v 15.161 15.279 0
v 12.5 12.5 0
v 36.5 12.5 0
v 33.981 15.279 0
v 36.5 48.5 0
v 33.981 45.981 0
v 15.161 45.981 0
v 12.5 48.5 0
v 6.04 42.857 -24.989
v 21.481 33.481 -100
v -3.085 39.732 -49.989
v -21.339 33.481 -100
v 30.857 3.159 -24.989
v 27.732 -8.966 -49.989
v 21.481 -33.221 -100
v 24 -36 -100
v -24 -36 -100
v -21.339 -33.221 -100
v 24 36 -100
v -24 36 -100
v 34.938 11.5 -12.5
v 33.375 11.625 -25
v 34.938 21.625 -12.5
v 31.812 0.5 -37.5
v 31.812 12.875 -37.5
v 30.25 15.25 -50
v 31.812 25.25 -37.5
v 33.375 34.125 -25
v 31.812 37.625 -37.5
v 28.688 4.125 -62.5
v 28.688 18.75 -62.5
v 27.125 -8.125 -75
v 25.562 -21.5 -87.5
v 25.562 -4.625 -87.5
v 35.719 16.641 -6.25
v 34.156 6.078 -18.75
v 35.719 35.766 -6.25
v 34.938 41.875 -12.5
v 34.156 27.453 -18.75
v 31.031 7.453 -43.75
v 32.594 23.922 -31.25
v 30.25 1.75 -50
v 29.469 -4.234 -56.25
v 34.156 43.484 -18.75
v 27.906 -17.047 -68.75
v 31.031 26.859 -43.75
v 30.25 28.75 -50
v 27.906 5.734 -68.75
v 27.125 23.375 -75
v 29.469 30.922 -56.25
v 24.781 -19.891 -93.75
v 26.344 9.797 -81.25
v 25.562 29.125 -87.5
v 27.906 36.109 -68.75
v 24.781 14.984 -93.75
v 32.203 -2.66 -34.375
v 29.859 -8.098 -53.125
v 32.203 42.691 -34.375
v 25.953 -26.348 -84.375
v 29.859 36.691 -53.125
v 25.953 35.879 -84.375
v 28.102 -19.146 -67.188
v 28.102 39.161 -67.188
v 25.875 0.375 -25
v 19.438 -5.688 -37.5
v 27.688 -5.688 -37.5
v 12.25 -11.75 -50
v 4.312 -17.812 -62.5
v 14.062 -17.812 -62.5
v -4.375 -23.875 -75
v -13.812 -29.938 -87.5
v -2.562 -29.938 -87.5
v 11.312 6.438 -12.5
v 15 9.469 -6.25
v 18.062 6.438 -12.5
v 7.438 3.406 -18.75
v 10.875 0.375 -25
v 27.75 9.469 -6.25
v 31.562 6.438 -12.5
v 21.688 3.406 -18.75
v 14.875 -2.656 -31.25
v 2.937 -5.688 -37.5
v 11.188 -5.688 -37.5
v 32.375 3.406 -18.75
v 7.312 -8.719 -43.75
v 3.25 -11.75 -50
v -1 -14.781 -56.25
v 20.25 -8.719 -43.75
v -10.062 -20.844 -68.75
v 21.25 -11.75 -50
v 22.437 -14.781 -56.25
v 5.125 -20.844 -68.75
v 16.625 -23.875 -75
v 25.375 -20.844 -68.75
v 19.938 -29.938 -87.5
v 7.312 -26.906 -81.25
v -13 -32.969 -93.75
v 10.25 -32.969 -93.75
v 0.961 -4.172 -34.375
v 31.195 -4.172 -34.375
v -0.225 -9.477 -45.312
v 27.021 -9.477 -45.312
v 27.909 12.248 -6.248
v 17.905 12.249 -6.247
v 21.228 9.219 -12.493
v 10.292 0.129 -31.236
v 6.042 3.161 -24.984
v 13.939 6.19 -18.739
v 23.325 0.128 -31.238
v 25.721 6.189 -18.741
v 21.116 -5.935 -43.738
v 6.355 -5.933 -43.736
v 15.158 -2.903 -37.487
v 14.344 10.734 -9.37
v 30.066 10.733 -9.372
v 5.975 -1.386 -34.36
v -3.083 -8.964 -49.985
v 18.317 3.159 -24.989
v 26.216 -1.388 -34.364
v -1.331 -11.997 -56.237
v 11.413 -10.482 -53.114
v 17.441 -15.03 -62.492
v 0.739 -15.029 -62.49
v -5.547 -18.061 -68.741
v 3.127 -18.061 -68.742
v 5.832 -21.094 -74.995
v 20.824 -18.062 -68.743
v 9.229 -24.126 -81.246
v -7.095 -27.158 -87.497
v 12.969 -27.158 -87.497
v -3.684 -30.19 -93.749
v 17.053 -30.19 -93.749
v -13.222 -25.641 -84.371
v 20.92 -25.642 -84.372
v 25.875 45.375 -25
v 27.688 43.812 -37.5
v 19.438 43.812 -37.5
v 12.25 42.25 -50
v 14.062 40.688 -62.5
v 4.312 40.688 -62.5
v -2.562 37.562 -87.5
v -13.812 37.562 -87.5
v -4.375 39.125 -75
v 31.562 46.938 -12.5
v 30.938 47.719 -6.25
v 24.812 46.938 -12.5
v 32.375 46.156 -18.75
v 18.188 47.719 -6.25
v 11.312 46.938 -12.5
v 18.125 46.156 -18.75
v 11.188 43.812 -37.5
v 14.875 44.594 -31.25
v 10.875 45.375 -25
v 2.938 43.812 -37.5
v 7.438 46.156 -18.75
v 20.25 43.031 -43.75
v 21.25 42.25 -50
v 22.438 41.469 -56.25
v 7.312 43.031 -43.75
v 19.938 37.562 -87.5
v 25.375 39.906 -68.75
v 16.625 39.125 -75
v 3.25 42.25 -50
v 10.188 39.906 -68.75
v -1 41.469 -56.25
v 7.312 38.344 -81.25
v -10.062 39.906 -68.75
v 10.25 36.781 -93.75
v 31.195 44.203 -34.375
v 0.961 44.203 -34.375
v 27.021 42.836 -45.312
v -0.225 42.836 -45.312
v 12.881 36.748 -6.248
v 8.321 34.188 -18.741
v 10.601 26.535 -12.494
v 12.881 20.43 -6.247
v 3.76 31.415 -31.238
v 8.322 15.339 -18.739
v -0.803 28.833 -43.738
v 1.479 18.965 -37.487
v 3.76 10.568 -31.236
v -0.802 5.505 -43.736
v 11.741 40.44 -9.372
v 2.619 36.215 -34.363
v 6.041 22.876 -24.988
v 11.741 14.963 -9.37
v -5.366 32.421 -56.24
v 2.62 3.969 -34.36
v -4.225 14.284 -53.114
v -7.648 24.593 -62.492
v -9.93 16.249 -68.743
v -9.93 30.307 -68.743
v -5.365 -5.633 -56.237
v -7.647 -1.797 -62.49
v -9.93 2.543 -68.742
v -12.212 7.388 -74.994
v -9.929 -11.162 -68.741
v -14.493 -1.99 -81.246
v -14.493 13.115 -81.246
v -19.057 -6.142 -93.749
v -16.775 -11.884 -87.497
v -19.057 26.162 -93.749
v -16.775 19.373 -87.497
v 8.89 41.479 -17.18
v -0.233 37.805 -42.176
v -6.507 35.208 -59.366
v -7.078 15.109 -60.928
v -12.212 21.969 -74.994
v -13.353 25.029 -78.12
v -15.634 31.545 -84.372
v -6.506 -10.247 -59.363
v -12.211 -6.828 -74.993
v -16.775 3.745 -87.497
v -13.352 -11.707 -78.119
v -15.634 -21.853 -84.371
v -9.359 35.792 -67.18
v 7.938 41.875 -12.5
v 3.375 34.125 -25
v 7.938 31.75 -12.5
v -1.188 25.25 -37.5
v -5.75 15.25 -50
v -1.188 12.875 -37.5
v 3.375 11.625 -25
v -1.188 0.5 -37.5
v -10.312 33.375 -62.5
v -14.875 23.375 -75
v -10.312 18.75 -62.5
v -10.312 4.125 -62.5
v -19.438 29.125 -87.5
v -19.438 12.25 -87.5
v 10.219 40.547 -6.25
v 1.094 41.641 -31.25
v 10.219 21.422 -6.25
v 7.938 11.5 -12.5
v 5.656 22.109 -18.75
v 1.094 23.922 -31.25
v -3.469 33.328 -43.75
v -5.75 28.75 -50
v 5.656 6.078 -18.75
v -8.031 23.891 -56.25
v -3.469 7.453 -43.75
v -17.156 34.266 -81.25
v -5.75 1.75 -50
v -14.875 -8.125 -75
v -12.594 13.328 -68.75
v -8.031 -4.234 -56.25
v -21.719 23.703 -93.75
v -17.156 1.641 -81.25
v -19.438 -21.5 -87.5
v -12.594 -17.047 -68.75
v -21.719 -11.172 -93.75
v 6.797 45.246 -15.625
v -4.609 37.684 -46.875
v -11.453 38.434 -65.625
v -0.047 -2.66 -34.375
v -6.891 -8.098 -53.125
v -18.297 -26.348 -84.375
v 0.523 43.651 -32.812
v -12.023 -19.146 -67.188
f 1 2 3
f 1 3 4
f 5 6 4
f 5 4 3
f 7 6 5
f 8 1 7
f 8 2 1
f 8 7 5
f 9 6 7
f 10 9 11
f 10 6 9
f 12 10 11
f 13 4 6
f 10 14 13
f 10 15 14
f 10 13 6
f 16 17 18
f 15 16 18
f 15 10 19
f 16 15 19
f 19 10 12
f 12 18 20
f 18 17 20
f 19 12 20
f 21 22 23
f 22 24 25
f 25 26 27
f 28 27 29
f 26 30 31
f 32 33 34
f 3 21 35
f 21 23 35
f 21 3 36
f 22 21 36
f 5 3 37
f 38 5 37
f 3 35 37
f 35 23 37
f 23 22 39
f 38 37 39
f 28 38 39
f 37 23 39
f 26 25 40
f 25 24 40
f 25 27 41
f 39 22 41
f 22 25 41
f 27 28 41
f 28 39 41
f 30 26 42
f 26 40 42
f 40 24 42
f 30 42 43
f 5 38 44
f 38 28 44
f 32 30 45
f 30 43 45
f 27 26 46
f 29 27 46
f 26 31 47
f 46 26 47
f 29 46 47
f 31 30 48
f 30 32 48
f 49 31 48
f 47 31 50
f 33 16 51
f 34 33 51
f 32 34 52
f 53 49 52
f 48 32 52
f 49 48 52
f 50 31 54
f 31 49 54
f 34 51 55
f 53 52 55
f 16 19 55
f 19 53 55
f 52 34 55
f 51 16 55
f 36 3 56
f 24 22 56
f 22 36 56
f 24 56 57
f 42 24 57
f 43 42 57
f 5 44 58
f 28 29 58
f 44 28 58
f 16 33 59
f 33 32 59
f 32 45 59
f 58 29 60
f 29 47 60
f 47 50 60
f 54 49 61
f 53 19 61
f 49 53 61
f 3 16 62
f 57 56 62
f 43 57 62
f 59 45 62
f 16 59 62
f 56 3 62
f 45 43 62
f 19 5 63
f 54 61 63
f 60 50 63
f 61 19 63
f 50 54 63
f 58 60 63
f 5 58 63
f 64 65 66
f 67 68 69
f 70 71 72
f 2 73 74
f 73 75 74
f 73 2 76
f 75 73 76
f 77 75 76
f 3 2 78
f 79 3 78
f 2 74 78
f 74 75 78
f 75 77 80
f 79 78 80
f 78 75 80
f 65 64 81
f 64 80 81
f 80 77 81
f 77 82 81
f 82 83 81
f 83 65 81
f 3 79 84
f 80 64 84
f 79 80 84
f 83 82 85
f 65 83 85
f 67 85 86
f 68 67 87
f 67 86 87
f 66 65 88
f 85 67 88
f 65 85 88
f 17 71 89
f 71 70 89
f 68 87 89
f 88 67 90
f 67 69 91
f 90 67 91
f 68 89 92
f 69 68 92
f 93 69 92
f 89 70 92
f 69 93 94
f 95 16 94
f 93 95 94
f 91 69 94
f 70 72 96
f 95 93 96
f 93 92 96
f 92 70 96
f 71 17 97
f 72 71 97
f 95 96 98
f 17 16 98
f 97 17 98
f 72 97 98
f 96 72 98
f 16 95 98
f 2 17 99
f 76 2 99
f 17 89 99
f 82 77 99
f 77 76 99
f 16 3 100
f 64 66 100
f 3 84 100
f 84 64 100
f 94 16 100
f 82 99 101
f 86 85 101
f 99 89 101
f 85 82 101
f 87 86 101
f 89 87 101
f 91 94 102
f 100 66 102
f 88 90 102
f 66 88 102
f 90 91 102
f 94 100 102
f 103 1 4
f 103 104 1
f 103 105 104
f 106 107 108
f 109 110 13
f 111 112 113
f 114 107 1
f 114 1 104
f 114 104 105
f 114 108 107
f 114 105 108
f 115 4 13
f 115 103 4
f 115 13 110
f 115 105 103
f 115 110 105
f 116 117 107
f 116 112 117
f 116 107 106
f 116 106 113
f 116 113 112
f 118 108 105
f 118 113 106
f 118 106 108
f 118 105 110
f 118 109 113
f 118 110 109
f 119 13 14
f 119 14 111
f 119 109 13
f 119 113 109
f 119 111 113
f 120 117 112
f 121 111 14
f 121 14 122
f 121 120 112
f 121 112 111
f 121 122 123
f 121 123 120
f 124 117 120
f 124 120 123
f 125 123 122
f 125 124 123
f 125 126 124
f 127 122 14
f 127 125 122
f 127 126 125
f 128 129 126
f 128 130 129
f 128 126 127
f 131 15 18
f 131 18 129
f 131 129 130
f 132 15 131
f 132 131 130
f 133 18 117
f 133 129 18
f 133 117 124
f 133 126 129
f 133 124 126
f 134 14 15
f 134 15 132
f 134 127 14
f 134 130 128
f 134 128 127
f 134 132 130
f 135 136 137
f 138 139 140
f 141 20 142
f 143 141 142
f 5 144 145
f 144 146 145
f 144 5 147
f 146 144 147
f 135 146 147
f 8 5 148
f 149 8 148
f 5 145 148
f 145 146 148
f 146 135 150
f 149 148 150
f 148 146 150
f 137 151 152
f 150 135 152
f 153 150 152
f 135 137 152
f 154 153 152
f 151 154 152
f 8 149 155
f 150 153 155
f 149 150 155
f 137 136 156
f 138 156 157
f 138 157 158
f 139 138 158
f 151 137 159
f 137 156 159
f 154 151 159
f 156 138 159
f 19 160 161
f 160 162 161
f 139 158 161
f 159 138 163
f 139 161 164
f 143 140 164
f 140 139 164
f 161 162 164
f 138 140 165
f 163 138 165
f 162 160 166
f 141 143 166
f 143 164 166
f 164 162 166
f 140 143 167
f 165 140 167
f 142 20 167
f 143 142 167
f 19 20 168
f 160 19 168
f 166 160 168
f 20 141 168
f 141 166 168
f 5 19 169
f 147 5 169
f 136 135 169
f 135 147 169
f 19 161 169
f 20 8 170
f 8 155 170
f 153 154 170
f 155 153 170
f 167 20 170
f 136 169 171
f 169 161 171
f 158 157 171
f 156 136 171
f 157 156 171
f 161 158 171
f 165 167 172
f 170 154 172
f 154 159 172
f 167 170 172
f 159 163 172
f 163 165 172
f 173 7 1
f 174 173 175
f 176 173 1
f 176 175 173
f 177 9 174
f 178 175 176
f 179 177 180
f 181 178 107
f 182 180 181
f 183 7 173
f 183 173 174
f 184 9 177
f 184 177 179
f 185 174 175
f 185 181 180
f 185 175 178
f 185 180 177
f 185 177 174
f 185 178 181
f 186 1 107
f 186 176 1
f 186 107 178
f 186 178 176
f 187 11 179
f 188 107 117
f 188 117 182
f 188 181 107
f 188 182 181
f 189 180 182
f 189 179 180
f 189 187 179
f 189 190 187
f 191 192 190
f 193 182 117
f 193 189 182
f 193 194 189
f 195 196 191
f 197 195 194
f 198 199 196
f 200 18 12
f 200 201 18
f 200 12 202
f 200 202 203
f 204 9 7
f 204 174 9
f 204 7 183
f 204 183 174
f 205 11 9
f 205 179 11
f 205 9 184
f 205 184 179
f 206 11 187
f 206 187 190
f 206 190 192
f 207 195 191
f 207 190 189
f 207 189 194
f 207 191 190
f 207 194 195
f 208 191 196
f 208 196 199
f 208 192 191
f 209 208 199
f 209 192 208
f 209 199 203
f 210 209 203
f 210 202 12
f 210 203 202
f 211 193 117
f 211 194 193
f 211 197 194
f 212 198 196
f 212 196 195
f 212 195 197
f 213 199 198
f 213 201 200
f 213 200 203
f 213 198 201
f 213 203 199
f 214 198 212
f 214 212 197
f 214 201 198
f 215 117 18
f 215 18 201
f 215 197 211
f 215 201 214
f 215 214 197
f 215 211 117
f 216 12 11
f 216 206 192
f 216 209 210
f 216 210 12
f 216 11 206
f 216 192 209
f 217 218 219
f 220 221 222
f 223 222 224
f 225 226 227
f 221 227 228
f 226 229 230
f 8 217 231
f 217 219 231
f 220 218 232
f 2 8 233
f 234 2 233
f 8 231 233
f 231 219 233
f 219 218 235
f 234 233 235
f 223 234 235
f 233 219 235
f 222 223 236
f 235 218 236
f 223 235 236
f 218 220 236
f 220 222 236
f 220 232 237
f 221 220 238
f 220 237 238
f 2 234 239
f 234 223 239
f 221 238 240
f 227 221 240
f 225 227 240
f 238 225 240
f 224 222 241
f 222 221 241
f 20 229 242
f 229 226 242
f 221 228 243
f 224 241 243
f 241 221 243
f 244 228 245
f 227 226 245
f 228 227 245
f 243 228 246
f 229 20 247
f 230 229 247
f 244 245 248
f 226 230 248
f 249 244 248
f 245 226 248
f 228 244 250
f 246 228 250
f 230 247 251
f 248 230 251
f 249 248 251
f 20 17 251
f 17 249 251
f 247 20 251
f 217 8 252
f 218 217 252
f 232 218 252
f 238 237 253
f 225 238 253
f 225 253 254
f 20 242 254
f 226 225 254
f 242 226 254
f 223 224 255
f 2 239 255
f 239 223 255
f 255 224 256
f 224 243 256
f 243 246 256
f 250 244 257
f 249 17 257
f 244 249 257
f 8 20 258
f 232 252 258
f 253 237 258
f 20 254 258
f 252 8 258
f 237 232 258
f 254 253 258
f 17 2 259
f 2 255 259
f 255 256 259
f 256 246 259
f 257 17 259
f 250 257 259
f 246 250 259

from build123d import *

# Parameters (mm, degrees)
F0_W = 24
F0_H = 36
F3_W = 48
F3_H = 72
F5_T = -2.5


with BuildPart() as f4:
    # F0 (on Top) → F4 section 0
    with BuildSketch(Plane.XY):
        with Locations((24.5, 30.5)):
            Rectangle(F0_W, F0_H)
    # F3 (on offset) → F4 section 1
    with BuildSketch(Plane.XY.offset(-100)):
        Rectangle(F3_W, F3_H)
    loft()

    # F5
    f5_openings = [f4.faces().sort_by_distance(p)[0] for p in [
        (24.5, 30.5, 0),
        (0, 0, -100),
    ]]
    offset(amount=F5_T, openings=f5_openings, kind=Kind.INTERSECTION)


solid = f4.part
